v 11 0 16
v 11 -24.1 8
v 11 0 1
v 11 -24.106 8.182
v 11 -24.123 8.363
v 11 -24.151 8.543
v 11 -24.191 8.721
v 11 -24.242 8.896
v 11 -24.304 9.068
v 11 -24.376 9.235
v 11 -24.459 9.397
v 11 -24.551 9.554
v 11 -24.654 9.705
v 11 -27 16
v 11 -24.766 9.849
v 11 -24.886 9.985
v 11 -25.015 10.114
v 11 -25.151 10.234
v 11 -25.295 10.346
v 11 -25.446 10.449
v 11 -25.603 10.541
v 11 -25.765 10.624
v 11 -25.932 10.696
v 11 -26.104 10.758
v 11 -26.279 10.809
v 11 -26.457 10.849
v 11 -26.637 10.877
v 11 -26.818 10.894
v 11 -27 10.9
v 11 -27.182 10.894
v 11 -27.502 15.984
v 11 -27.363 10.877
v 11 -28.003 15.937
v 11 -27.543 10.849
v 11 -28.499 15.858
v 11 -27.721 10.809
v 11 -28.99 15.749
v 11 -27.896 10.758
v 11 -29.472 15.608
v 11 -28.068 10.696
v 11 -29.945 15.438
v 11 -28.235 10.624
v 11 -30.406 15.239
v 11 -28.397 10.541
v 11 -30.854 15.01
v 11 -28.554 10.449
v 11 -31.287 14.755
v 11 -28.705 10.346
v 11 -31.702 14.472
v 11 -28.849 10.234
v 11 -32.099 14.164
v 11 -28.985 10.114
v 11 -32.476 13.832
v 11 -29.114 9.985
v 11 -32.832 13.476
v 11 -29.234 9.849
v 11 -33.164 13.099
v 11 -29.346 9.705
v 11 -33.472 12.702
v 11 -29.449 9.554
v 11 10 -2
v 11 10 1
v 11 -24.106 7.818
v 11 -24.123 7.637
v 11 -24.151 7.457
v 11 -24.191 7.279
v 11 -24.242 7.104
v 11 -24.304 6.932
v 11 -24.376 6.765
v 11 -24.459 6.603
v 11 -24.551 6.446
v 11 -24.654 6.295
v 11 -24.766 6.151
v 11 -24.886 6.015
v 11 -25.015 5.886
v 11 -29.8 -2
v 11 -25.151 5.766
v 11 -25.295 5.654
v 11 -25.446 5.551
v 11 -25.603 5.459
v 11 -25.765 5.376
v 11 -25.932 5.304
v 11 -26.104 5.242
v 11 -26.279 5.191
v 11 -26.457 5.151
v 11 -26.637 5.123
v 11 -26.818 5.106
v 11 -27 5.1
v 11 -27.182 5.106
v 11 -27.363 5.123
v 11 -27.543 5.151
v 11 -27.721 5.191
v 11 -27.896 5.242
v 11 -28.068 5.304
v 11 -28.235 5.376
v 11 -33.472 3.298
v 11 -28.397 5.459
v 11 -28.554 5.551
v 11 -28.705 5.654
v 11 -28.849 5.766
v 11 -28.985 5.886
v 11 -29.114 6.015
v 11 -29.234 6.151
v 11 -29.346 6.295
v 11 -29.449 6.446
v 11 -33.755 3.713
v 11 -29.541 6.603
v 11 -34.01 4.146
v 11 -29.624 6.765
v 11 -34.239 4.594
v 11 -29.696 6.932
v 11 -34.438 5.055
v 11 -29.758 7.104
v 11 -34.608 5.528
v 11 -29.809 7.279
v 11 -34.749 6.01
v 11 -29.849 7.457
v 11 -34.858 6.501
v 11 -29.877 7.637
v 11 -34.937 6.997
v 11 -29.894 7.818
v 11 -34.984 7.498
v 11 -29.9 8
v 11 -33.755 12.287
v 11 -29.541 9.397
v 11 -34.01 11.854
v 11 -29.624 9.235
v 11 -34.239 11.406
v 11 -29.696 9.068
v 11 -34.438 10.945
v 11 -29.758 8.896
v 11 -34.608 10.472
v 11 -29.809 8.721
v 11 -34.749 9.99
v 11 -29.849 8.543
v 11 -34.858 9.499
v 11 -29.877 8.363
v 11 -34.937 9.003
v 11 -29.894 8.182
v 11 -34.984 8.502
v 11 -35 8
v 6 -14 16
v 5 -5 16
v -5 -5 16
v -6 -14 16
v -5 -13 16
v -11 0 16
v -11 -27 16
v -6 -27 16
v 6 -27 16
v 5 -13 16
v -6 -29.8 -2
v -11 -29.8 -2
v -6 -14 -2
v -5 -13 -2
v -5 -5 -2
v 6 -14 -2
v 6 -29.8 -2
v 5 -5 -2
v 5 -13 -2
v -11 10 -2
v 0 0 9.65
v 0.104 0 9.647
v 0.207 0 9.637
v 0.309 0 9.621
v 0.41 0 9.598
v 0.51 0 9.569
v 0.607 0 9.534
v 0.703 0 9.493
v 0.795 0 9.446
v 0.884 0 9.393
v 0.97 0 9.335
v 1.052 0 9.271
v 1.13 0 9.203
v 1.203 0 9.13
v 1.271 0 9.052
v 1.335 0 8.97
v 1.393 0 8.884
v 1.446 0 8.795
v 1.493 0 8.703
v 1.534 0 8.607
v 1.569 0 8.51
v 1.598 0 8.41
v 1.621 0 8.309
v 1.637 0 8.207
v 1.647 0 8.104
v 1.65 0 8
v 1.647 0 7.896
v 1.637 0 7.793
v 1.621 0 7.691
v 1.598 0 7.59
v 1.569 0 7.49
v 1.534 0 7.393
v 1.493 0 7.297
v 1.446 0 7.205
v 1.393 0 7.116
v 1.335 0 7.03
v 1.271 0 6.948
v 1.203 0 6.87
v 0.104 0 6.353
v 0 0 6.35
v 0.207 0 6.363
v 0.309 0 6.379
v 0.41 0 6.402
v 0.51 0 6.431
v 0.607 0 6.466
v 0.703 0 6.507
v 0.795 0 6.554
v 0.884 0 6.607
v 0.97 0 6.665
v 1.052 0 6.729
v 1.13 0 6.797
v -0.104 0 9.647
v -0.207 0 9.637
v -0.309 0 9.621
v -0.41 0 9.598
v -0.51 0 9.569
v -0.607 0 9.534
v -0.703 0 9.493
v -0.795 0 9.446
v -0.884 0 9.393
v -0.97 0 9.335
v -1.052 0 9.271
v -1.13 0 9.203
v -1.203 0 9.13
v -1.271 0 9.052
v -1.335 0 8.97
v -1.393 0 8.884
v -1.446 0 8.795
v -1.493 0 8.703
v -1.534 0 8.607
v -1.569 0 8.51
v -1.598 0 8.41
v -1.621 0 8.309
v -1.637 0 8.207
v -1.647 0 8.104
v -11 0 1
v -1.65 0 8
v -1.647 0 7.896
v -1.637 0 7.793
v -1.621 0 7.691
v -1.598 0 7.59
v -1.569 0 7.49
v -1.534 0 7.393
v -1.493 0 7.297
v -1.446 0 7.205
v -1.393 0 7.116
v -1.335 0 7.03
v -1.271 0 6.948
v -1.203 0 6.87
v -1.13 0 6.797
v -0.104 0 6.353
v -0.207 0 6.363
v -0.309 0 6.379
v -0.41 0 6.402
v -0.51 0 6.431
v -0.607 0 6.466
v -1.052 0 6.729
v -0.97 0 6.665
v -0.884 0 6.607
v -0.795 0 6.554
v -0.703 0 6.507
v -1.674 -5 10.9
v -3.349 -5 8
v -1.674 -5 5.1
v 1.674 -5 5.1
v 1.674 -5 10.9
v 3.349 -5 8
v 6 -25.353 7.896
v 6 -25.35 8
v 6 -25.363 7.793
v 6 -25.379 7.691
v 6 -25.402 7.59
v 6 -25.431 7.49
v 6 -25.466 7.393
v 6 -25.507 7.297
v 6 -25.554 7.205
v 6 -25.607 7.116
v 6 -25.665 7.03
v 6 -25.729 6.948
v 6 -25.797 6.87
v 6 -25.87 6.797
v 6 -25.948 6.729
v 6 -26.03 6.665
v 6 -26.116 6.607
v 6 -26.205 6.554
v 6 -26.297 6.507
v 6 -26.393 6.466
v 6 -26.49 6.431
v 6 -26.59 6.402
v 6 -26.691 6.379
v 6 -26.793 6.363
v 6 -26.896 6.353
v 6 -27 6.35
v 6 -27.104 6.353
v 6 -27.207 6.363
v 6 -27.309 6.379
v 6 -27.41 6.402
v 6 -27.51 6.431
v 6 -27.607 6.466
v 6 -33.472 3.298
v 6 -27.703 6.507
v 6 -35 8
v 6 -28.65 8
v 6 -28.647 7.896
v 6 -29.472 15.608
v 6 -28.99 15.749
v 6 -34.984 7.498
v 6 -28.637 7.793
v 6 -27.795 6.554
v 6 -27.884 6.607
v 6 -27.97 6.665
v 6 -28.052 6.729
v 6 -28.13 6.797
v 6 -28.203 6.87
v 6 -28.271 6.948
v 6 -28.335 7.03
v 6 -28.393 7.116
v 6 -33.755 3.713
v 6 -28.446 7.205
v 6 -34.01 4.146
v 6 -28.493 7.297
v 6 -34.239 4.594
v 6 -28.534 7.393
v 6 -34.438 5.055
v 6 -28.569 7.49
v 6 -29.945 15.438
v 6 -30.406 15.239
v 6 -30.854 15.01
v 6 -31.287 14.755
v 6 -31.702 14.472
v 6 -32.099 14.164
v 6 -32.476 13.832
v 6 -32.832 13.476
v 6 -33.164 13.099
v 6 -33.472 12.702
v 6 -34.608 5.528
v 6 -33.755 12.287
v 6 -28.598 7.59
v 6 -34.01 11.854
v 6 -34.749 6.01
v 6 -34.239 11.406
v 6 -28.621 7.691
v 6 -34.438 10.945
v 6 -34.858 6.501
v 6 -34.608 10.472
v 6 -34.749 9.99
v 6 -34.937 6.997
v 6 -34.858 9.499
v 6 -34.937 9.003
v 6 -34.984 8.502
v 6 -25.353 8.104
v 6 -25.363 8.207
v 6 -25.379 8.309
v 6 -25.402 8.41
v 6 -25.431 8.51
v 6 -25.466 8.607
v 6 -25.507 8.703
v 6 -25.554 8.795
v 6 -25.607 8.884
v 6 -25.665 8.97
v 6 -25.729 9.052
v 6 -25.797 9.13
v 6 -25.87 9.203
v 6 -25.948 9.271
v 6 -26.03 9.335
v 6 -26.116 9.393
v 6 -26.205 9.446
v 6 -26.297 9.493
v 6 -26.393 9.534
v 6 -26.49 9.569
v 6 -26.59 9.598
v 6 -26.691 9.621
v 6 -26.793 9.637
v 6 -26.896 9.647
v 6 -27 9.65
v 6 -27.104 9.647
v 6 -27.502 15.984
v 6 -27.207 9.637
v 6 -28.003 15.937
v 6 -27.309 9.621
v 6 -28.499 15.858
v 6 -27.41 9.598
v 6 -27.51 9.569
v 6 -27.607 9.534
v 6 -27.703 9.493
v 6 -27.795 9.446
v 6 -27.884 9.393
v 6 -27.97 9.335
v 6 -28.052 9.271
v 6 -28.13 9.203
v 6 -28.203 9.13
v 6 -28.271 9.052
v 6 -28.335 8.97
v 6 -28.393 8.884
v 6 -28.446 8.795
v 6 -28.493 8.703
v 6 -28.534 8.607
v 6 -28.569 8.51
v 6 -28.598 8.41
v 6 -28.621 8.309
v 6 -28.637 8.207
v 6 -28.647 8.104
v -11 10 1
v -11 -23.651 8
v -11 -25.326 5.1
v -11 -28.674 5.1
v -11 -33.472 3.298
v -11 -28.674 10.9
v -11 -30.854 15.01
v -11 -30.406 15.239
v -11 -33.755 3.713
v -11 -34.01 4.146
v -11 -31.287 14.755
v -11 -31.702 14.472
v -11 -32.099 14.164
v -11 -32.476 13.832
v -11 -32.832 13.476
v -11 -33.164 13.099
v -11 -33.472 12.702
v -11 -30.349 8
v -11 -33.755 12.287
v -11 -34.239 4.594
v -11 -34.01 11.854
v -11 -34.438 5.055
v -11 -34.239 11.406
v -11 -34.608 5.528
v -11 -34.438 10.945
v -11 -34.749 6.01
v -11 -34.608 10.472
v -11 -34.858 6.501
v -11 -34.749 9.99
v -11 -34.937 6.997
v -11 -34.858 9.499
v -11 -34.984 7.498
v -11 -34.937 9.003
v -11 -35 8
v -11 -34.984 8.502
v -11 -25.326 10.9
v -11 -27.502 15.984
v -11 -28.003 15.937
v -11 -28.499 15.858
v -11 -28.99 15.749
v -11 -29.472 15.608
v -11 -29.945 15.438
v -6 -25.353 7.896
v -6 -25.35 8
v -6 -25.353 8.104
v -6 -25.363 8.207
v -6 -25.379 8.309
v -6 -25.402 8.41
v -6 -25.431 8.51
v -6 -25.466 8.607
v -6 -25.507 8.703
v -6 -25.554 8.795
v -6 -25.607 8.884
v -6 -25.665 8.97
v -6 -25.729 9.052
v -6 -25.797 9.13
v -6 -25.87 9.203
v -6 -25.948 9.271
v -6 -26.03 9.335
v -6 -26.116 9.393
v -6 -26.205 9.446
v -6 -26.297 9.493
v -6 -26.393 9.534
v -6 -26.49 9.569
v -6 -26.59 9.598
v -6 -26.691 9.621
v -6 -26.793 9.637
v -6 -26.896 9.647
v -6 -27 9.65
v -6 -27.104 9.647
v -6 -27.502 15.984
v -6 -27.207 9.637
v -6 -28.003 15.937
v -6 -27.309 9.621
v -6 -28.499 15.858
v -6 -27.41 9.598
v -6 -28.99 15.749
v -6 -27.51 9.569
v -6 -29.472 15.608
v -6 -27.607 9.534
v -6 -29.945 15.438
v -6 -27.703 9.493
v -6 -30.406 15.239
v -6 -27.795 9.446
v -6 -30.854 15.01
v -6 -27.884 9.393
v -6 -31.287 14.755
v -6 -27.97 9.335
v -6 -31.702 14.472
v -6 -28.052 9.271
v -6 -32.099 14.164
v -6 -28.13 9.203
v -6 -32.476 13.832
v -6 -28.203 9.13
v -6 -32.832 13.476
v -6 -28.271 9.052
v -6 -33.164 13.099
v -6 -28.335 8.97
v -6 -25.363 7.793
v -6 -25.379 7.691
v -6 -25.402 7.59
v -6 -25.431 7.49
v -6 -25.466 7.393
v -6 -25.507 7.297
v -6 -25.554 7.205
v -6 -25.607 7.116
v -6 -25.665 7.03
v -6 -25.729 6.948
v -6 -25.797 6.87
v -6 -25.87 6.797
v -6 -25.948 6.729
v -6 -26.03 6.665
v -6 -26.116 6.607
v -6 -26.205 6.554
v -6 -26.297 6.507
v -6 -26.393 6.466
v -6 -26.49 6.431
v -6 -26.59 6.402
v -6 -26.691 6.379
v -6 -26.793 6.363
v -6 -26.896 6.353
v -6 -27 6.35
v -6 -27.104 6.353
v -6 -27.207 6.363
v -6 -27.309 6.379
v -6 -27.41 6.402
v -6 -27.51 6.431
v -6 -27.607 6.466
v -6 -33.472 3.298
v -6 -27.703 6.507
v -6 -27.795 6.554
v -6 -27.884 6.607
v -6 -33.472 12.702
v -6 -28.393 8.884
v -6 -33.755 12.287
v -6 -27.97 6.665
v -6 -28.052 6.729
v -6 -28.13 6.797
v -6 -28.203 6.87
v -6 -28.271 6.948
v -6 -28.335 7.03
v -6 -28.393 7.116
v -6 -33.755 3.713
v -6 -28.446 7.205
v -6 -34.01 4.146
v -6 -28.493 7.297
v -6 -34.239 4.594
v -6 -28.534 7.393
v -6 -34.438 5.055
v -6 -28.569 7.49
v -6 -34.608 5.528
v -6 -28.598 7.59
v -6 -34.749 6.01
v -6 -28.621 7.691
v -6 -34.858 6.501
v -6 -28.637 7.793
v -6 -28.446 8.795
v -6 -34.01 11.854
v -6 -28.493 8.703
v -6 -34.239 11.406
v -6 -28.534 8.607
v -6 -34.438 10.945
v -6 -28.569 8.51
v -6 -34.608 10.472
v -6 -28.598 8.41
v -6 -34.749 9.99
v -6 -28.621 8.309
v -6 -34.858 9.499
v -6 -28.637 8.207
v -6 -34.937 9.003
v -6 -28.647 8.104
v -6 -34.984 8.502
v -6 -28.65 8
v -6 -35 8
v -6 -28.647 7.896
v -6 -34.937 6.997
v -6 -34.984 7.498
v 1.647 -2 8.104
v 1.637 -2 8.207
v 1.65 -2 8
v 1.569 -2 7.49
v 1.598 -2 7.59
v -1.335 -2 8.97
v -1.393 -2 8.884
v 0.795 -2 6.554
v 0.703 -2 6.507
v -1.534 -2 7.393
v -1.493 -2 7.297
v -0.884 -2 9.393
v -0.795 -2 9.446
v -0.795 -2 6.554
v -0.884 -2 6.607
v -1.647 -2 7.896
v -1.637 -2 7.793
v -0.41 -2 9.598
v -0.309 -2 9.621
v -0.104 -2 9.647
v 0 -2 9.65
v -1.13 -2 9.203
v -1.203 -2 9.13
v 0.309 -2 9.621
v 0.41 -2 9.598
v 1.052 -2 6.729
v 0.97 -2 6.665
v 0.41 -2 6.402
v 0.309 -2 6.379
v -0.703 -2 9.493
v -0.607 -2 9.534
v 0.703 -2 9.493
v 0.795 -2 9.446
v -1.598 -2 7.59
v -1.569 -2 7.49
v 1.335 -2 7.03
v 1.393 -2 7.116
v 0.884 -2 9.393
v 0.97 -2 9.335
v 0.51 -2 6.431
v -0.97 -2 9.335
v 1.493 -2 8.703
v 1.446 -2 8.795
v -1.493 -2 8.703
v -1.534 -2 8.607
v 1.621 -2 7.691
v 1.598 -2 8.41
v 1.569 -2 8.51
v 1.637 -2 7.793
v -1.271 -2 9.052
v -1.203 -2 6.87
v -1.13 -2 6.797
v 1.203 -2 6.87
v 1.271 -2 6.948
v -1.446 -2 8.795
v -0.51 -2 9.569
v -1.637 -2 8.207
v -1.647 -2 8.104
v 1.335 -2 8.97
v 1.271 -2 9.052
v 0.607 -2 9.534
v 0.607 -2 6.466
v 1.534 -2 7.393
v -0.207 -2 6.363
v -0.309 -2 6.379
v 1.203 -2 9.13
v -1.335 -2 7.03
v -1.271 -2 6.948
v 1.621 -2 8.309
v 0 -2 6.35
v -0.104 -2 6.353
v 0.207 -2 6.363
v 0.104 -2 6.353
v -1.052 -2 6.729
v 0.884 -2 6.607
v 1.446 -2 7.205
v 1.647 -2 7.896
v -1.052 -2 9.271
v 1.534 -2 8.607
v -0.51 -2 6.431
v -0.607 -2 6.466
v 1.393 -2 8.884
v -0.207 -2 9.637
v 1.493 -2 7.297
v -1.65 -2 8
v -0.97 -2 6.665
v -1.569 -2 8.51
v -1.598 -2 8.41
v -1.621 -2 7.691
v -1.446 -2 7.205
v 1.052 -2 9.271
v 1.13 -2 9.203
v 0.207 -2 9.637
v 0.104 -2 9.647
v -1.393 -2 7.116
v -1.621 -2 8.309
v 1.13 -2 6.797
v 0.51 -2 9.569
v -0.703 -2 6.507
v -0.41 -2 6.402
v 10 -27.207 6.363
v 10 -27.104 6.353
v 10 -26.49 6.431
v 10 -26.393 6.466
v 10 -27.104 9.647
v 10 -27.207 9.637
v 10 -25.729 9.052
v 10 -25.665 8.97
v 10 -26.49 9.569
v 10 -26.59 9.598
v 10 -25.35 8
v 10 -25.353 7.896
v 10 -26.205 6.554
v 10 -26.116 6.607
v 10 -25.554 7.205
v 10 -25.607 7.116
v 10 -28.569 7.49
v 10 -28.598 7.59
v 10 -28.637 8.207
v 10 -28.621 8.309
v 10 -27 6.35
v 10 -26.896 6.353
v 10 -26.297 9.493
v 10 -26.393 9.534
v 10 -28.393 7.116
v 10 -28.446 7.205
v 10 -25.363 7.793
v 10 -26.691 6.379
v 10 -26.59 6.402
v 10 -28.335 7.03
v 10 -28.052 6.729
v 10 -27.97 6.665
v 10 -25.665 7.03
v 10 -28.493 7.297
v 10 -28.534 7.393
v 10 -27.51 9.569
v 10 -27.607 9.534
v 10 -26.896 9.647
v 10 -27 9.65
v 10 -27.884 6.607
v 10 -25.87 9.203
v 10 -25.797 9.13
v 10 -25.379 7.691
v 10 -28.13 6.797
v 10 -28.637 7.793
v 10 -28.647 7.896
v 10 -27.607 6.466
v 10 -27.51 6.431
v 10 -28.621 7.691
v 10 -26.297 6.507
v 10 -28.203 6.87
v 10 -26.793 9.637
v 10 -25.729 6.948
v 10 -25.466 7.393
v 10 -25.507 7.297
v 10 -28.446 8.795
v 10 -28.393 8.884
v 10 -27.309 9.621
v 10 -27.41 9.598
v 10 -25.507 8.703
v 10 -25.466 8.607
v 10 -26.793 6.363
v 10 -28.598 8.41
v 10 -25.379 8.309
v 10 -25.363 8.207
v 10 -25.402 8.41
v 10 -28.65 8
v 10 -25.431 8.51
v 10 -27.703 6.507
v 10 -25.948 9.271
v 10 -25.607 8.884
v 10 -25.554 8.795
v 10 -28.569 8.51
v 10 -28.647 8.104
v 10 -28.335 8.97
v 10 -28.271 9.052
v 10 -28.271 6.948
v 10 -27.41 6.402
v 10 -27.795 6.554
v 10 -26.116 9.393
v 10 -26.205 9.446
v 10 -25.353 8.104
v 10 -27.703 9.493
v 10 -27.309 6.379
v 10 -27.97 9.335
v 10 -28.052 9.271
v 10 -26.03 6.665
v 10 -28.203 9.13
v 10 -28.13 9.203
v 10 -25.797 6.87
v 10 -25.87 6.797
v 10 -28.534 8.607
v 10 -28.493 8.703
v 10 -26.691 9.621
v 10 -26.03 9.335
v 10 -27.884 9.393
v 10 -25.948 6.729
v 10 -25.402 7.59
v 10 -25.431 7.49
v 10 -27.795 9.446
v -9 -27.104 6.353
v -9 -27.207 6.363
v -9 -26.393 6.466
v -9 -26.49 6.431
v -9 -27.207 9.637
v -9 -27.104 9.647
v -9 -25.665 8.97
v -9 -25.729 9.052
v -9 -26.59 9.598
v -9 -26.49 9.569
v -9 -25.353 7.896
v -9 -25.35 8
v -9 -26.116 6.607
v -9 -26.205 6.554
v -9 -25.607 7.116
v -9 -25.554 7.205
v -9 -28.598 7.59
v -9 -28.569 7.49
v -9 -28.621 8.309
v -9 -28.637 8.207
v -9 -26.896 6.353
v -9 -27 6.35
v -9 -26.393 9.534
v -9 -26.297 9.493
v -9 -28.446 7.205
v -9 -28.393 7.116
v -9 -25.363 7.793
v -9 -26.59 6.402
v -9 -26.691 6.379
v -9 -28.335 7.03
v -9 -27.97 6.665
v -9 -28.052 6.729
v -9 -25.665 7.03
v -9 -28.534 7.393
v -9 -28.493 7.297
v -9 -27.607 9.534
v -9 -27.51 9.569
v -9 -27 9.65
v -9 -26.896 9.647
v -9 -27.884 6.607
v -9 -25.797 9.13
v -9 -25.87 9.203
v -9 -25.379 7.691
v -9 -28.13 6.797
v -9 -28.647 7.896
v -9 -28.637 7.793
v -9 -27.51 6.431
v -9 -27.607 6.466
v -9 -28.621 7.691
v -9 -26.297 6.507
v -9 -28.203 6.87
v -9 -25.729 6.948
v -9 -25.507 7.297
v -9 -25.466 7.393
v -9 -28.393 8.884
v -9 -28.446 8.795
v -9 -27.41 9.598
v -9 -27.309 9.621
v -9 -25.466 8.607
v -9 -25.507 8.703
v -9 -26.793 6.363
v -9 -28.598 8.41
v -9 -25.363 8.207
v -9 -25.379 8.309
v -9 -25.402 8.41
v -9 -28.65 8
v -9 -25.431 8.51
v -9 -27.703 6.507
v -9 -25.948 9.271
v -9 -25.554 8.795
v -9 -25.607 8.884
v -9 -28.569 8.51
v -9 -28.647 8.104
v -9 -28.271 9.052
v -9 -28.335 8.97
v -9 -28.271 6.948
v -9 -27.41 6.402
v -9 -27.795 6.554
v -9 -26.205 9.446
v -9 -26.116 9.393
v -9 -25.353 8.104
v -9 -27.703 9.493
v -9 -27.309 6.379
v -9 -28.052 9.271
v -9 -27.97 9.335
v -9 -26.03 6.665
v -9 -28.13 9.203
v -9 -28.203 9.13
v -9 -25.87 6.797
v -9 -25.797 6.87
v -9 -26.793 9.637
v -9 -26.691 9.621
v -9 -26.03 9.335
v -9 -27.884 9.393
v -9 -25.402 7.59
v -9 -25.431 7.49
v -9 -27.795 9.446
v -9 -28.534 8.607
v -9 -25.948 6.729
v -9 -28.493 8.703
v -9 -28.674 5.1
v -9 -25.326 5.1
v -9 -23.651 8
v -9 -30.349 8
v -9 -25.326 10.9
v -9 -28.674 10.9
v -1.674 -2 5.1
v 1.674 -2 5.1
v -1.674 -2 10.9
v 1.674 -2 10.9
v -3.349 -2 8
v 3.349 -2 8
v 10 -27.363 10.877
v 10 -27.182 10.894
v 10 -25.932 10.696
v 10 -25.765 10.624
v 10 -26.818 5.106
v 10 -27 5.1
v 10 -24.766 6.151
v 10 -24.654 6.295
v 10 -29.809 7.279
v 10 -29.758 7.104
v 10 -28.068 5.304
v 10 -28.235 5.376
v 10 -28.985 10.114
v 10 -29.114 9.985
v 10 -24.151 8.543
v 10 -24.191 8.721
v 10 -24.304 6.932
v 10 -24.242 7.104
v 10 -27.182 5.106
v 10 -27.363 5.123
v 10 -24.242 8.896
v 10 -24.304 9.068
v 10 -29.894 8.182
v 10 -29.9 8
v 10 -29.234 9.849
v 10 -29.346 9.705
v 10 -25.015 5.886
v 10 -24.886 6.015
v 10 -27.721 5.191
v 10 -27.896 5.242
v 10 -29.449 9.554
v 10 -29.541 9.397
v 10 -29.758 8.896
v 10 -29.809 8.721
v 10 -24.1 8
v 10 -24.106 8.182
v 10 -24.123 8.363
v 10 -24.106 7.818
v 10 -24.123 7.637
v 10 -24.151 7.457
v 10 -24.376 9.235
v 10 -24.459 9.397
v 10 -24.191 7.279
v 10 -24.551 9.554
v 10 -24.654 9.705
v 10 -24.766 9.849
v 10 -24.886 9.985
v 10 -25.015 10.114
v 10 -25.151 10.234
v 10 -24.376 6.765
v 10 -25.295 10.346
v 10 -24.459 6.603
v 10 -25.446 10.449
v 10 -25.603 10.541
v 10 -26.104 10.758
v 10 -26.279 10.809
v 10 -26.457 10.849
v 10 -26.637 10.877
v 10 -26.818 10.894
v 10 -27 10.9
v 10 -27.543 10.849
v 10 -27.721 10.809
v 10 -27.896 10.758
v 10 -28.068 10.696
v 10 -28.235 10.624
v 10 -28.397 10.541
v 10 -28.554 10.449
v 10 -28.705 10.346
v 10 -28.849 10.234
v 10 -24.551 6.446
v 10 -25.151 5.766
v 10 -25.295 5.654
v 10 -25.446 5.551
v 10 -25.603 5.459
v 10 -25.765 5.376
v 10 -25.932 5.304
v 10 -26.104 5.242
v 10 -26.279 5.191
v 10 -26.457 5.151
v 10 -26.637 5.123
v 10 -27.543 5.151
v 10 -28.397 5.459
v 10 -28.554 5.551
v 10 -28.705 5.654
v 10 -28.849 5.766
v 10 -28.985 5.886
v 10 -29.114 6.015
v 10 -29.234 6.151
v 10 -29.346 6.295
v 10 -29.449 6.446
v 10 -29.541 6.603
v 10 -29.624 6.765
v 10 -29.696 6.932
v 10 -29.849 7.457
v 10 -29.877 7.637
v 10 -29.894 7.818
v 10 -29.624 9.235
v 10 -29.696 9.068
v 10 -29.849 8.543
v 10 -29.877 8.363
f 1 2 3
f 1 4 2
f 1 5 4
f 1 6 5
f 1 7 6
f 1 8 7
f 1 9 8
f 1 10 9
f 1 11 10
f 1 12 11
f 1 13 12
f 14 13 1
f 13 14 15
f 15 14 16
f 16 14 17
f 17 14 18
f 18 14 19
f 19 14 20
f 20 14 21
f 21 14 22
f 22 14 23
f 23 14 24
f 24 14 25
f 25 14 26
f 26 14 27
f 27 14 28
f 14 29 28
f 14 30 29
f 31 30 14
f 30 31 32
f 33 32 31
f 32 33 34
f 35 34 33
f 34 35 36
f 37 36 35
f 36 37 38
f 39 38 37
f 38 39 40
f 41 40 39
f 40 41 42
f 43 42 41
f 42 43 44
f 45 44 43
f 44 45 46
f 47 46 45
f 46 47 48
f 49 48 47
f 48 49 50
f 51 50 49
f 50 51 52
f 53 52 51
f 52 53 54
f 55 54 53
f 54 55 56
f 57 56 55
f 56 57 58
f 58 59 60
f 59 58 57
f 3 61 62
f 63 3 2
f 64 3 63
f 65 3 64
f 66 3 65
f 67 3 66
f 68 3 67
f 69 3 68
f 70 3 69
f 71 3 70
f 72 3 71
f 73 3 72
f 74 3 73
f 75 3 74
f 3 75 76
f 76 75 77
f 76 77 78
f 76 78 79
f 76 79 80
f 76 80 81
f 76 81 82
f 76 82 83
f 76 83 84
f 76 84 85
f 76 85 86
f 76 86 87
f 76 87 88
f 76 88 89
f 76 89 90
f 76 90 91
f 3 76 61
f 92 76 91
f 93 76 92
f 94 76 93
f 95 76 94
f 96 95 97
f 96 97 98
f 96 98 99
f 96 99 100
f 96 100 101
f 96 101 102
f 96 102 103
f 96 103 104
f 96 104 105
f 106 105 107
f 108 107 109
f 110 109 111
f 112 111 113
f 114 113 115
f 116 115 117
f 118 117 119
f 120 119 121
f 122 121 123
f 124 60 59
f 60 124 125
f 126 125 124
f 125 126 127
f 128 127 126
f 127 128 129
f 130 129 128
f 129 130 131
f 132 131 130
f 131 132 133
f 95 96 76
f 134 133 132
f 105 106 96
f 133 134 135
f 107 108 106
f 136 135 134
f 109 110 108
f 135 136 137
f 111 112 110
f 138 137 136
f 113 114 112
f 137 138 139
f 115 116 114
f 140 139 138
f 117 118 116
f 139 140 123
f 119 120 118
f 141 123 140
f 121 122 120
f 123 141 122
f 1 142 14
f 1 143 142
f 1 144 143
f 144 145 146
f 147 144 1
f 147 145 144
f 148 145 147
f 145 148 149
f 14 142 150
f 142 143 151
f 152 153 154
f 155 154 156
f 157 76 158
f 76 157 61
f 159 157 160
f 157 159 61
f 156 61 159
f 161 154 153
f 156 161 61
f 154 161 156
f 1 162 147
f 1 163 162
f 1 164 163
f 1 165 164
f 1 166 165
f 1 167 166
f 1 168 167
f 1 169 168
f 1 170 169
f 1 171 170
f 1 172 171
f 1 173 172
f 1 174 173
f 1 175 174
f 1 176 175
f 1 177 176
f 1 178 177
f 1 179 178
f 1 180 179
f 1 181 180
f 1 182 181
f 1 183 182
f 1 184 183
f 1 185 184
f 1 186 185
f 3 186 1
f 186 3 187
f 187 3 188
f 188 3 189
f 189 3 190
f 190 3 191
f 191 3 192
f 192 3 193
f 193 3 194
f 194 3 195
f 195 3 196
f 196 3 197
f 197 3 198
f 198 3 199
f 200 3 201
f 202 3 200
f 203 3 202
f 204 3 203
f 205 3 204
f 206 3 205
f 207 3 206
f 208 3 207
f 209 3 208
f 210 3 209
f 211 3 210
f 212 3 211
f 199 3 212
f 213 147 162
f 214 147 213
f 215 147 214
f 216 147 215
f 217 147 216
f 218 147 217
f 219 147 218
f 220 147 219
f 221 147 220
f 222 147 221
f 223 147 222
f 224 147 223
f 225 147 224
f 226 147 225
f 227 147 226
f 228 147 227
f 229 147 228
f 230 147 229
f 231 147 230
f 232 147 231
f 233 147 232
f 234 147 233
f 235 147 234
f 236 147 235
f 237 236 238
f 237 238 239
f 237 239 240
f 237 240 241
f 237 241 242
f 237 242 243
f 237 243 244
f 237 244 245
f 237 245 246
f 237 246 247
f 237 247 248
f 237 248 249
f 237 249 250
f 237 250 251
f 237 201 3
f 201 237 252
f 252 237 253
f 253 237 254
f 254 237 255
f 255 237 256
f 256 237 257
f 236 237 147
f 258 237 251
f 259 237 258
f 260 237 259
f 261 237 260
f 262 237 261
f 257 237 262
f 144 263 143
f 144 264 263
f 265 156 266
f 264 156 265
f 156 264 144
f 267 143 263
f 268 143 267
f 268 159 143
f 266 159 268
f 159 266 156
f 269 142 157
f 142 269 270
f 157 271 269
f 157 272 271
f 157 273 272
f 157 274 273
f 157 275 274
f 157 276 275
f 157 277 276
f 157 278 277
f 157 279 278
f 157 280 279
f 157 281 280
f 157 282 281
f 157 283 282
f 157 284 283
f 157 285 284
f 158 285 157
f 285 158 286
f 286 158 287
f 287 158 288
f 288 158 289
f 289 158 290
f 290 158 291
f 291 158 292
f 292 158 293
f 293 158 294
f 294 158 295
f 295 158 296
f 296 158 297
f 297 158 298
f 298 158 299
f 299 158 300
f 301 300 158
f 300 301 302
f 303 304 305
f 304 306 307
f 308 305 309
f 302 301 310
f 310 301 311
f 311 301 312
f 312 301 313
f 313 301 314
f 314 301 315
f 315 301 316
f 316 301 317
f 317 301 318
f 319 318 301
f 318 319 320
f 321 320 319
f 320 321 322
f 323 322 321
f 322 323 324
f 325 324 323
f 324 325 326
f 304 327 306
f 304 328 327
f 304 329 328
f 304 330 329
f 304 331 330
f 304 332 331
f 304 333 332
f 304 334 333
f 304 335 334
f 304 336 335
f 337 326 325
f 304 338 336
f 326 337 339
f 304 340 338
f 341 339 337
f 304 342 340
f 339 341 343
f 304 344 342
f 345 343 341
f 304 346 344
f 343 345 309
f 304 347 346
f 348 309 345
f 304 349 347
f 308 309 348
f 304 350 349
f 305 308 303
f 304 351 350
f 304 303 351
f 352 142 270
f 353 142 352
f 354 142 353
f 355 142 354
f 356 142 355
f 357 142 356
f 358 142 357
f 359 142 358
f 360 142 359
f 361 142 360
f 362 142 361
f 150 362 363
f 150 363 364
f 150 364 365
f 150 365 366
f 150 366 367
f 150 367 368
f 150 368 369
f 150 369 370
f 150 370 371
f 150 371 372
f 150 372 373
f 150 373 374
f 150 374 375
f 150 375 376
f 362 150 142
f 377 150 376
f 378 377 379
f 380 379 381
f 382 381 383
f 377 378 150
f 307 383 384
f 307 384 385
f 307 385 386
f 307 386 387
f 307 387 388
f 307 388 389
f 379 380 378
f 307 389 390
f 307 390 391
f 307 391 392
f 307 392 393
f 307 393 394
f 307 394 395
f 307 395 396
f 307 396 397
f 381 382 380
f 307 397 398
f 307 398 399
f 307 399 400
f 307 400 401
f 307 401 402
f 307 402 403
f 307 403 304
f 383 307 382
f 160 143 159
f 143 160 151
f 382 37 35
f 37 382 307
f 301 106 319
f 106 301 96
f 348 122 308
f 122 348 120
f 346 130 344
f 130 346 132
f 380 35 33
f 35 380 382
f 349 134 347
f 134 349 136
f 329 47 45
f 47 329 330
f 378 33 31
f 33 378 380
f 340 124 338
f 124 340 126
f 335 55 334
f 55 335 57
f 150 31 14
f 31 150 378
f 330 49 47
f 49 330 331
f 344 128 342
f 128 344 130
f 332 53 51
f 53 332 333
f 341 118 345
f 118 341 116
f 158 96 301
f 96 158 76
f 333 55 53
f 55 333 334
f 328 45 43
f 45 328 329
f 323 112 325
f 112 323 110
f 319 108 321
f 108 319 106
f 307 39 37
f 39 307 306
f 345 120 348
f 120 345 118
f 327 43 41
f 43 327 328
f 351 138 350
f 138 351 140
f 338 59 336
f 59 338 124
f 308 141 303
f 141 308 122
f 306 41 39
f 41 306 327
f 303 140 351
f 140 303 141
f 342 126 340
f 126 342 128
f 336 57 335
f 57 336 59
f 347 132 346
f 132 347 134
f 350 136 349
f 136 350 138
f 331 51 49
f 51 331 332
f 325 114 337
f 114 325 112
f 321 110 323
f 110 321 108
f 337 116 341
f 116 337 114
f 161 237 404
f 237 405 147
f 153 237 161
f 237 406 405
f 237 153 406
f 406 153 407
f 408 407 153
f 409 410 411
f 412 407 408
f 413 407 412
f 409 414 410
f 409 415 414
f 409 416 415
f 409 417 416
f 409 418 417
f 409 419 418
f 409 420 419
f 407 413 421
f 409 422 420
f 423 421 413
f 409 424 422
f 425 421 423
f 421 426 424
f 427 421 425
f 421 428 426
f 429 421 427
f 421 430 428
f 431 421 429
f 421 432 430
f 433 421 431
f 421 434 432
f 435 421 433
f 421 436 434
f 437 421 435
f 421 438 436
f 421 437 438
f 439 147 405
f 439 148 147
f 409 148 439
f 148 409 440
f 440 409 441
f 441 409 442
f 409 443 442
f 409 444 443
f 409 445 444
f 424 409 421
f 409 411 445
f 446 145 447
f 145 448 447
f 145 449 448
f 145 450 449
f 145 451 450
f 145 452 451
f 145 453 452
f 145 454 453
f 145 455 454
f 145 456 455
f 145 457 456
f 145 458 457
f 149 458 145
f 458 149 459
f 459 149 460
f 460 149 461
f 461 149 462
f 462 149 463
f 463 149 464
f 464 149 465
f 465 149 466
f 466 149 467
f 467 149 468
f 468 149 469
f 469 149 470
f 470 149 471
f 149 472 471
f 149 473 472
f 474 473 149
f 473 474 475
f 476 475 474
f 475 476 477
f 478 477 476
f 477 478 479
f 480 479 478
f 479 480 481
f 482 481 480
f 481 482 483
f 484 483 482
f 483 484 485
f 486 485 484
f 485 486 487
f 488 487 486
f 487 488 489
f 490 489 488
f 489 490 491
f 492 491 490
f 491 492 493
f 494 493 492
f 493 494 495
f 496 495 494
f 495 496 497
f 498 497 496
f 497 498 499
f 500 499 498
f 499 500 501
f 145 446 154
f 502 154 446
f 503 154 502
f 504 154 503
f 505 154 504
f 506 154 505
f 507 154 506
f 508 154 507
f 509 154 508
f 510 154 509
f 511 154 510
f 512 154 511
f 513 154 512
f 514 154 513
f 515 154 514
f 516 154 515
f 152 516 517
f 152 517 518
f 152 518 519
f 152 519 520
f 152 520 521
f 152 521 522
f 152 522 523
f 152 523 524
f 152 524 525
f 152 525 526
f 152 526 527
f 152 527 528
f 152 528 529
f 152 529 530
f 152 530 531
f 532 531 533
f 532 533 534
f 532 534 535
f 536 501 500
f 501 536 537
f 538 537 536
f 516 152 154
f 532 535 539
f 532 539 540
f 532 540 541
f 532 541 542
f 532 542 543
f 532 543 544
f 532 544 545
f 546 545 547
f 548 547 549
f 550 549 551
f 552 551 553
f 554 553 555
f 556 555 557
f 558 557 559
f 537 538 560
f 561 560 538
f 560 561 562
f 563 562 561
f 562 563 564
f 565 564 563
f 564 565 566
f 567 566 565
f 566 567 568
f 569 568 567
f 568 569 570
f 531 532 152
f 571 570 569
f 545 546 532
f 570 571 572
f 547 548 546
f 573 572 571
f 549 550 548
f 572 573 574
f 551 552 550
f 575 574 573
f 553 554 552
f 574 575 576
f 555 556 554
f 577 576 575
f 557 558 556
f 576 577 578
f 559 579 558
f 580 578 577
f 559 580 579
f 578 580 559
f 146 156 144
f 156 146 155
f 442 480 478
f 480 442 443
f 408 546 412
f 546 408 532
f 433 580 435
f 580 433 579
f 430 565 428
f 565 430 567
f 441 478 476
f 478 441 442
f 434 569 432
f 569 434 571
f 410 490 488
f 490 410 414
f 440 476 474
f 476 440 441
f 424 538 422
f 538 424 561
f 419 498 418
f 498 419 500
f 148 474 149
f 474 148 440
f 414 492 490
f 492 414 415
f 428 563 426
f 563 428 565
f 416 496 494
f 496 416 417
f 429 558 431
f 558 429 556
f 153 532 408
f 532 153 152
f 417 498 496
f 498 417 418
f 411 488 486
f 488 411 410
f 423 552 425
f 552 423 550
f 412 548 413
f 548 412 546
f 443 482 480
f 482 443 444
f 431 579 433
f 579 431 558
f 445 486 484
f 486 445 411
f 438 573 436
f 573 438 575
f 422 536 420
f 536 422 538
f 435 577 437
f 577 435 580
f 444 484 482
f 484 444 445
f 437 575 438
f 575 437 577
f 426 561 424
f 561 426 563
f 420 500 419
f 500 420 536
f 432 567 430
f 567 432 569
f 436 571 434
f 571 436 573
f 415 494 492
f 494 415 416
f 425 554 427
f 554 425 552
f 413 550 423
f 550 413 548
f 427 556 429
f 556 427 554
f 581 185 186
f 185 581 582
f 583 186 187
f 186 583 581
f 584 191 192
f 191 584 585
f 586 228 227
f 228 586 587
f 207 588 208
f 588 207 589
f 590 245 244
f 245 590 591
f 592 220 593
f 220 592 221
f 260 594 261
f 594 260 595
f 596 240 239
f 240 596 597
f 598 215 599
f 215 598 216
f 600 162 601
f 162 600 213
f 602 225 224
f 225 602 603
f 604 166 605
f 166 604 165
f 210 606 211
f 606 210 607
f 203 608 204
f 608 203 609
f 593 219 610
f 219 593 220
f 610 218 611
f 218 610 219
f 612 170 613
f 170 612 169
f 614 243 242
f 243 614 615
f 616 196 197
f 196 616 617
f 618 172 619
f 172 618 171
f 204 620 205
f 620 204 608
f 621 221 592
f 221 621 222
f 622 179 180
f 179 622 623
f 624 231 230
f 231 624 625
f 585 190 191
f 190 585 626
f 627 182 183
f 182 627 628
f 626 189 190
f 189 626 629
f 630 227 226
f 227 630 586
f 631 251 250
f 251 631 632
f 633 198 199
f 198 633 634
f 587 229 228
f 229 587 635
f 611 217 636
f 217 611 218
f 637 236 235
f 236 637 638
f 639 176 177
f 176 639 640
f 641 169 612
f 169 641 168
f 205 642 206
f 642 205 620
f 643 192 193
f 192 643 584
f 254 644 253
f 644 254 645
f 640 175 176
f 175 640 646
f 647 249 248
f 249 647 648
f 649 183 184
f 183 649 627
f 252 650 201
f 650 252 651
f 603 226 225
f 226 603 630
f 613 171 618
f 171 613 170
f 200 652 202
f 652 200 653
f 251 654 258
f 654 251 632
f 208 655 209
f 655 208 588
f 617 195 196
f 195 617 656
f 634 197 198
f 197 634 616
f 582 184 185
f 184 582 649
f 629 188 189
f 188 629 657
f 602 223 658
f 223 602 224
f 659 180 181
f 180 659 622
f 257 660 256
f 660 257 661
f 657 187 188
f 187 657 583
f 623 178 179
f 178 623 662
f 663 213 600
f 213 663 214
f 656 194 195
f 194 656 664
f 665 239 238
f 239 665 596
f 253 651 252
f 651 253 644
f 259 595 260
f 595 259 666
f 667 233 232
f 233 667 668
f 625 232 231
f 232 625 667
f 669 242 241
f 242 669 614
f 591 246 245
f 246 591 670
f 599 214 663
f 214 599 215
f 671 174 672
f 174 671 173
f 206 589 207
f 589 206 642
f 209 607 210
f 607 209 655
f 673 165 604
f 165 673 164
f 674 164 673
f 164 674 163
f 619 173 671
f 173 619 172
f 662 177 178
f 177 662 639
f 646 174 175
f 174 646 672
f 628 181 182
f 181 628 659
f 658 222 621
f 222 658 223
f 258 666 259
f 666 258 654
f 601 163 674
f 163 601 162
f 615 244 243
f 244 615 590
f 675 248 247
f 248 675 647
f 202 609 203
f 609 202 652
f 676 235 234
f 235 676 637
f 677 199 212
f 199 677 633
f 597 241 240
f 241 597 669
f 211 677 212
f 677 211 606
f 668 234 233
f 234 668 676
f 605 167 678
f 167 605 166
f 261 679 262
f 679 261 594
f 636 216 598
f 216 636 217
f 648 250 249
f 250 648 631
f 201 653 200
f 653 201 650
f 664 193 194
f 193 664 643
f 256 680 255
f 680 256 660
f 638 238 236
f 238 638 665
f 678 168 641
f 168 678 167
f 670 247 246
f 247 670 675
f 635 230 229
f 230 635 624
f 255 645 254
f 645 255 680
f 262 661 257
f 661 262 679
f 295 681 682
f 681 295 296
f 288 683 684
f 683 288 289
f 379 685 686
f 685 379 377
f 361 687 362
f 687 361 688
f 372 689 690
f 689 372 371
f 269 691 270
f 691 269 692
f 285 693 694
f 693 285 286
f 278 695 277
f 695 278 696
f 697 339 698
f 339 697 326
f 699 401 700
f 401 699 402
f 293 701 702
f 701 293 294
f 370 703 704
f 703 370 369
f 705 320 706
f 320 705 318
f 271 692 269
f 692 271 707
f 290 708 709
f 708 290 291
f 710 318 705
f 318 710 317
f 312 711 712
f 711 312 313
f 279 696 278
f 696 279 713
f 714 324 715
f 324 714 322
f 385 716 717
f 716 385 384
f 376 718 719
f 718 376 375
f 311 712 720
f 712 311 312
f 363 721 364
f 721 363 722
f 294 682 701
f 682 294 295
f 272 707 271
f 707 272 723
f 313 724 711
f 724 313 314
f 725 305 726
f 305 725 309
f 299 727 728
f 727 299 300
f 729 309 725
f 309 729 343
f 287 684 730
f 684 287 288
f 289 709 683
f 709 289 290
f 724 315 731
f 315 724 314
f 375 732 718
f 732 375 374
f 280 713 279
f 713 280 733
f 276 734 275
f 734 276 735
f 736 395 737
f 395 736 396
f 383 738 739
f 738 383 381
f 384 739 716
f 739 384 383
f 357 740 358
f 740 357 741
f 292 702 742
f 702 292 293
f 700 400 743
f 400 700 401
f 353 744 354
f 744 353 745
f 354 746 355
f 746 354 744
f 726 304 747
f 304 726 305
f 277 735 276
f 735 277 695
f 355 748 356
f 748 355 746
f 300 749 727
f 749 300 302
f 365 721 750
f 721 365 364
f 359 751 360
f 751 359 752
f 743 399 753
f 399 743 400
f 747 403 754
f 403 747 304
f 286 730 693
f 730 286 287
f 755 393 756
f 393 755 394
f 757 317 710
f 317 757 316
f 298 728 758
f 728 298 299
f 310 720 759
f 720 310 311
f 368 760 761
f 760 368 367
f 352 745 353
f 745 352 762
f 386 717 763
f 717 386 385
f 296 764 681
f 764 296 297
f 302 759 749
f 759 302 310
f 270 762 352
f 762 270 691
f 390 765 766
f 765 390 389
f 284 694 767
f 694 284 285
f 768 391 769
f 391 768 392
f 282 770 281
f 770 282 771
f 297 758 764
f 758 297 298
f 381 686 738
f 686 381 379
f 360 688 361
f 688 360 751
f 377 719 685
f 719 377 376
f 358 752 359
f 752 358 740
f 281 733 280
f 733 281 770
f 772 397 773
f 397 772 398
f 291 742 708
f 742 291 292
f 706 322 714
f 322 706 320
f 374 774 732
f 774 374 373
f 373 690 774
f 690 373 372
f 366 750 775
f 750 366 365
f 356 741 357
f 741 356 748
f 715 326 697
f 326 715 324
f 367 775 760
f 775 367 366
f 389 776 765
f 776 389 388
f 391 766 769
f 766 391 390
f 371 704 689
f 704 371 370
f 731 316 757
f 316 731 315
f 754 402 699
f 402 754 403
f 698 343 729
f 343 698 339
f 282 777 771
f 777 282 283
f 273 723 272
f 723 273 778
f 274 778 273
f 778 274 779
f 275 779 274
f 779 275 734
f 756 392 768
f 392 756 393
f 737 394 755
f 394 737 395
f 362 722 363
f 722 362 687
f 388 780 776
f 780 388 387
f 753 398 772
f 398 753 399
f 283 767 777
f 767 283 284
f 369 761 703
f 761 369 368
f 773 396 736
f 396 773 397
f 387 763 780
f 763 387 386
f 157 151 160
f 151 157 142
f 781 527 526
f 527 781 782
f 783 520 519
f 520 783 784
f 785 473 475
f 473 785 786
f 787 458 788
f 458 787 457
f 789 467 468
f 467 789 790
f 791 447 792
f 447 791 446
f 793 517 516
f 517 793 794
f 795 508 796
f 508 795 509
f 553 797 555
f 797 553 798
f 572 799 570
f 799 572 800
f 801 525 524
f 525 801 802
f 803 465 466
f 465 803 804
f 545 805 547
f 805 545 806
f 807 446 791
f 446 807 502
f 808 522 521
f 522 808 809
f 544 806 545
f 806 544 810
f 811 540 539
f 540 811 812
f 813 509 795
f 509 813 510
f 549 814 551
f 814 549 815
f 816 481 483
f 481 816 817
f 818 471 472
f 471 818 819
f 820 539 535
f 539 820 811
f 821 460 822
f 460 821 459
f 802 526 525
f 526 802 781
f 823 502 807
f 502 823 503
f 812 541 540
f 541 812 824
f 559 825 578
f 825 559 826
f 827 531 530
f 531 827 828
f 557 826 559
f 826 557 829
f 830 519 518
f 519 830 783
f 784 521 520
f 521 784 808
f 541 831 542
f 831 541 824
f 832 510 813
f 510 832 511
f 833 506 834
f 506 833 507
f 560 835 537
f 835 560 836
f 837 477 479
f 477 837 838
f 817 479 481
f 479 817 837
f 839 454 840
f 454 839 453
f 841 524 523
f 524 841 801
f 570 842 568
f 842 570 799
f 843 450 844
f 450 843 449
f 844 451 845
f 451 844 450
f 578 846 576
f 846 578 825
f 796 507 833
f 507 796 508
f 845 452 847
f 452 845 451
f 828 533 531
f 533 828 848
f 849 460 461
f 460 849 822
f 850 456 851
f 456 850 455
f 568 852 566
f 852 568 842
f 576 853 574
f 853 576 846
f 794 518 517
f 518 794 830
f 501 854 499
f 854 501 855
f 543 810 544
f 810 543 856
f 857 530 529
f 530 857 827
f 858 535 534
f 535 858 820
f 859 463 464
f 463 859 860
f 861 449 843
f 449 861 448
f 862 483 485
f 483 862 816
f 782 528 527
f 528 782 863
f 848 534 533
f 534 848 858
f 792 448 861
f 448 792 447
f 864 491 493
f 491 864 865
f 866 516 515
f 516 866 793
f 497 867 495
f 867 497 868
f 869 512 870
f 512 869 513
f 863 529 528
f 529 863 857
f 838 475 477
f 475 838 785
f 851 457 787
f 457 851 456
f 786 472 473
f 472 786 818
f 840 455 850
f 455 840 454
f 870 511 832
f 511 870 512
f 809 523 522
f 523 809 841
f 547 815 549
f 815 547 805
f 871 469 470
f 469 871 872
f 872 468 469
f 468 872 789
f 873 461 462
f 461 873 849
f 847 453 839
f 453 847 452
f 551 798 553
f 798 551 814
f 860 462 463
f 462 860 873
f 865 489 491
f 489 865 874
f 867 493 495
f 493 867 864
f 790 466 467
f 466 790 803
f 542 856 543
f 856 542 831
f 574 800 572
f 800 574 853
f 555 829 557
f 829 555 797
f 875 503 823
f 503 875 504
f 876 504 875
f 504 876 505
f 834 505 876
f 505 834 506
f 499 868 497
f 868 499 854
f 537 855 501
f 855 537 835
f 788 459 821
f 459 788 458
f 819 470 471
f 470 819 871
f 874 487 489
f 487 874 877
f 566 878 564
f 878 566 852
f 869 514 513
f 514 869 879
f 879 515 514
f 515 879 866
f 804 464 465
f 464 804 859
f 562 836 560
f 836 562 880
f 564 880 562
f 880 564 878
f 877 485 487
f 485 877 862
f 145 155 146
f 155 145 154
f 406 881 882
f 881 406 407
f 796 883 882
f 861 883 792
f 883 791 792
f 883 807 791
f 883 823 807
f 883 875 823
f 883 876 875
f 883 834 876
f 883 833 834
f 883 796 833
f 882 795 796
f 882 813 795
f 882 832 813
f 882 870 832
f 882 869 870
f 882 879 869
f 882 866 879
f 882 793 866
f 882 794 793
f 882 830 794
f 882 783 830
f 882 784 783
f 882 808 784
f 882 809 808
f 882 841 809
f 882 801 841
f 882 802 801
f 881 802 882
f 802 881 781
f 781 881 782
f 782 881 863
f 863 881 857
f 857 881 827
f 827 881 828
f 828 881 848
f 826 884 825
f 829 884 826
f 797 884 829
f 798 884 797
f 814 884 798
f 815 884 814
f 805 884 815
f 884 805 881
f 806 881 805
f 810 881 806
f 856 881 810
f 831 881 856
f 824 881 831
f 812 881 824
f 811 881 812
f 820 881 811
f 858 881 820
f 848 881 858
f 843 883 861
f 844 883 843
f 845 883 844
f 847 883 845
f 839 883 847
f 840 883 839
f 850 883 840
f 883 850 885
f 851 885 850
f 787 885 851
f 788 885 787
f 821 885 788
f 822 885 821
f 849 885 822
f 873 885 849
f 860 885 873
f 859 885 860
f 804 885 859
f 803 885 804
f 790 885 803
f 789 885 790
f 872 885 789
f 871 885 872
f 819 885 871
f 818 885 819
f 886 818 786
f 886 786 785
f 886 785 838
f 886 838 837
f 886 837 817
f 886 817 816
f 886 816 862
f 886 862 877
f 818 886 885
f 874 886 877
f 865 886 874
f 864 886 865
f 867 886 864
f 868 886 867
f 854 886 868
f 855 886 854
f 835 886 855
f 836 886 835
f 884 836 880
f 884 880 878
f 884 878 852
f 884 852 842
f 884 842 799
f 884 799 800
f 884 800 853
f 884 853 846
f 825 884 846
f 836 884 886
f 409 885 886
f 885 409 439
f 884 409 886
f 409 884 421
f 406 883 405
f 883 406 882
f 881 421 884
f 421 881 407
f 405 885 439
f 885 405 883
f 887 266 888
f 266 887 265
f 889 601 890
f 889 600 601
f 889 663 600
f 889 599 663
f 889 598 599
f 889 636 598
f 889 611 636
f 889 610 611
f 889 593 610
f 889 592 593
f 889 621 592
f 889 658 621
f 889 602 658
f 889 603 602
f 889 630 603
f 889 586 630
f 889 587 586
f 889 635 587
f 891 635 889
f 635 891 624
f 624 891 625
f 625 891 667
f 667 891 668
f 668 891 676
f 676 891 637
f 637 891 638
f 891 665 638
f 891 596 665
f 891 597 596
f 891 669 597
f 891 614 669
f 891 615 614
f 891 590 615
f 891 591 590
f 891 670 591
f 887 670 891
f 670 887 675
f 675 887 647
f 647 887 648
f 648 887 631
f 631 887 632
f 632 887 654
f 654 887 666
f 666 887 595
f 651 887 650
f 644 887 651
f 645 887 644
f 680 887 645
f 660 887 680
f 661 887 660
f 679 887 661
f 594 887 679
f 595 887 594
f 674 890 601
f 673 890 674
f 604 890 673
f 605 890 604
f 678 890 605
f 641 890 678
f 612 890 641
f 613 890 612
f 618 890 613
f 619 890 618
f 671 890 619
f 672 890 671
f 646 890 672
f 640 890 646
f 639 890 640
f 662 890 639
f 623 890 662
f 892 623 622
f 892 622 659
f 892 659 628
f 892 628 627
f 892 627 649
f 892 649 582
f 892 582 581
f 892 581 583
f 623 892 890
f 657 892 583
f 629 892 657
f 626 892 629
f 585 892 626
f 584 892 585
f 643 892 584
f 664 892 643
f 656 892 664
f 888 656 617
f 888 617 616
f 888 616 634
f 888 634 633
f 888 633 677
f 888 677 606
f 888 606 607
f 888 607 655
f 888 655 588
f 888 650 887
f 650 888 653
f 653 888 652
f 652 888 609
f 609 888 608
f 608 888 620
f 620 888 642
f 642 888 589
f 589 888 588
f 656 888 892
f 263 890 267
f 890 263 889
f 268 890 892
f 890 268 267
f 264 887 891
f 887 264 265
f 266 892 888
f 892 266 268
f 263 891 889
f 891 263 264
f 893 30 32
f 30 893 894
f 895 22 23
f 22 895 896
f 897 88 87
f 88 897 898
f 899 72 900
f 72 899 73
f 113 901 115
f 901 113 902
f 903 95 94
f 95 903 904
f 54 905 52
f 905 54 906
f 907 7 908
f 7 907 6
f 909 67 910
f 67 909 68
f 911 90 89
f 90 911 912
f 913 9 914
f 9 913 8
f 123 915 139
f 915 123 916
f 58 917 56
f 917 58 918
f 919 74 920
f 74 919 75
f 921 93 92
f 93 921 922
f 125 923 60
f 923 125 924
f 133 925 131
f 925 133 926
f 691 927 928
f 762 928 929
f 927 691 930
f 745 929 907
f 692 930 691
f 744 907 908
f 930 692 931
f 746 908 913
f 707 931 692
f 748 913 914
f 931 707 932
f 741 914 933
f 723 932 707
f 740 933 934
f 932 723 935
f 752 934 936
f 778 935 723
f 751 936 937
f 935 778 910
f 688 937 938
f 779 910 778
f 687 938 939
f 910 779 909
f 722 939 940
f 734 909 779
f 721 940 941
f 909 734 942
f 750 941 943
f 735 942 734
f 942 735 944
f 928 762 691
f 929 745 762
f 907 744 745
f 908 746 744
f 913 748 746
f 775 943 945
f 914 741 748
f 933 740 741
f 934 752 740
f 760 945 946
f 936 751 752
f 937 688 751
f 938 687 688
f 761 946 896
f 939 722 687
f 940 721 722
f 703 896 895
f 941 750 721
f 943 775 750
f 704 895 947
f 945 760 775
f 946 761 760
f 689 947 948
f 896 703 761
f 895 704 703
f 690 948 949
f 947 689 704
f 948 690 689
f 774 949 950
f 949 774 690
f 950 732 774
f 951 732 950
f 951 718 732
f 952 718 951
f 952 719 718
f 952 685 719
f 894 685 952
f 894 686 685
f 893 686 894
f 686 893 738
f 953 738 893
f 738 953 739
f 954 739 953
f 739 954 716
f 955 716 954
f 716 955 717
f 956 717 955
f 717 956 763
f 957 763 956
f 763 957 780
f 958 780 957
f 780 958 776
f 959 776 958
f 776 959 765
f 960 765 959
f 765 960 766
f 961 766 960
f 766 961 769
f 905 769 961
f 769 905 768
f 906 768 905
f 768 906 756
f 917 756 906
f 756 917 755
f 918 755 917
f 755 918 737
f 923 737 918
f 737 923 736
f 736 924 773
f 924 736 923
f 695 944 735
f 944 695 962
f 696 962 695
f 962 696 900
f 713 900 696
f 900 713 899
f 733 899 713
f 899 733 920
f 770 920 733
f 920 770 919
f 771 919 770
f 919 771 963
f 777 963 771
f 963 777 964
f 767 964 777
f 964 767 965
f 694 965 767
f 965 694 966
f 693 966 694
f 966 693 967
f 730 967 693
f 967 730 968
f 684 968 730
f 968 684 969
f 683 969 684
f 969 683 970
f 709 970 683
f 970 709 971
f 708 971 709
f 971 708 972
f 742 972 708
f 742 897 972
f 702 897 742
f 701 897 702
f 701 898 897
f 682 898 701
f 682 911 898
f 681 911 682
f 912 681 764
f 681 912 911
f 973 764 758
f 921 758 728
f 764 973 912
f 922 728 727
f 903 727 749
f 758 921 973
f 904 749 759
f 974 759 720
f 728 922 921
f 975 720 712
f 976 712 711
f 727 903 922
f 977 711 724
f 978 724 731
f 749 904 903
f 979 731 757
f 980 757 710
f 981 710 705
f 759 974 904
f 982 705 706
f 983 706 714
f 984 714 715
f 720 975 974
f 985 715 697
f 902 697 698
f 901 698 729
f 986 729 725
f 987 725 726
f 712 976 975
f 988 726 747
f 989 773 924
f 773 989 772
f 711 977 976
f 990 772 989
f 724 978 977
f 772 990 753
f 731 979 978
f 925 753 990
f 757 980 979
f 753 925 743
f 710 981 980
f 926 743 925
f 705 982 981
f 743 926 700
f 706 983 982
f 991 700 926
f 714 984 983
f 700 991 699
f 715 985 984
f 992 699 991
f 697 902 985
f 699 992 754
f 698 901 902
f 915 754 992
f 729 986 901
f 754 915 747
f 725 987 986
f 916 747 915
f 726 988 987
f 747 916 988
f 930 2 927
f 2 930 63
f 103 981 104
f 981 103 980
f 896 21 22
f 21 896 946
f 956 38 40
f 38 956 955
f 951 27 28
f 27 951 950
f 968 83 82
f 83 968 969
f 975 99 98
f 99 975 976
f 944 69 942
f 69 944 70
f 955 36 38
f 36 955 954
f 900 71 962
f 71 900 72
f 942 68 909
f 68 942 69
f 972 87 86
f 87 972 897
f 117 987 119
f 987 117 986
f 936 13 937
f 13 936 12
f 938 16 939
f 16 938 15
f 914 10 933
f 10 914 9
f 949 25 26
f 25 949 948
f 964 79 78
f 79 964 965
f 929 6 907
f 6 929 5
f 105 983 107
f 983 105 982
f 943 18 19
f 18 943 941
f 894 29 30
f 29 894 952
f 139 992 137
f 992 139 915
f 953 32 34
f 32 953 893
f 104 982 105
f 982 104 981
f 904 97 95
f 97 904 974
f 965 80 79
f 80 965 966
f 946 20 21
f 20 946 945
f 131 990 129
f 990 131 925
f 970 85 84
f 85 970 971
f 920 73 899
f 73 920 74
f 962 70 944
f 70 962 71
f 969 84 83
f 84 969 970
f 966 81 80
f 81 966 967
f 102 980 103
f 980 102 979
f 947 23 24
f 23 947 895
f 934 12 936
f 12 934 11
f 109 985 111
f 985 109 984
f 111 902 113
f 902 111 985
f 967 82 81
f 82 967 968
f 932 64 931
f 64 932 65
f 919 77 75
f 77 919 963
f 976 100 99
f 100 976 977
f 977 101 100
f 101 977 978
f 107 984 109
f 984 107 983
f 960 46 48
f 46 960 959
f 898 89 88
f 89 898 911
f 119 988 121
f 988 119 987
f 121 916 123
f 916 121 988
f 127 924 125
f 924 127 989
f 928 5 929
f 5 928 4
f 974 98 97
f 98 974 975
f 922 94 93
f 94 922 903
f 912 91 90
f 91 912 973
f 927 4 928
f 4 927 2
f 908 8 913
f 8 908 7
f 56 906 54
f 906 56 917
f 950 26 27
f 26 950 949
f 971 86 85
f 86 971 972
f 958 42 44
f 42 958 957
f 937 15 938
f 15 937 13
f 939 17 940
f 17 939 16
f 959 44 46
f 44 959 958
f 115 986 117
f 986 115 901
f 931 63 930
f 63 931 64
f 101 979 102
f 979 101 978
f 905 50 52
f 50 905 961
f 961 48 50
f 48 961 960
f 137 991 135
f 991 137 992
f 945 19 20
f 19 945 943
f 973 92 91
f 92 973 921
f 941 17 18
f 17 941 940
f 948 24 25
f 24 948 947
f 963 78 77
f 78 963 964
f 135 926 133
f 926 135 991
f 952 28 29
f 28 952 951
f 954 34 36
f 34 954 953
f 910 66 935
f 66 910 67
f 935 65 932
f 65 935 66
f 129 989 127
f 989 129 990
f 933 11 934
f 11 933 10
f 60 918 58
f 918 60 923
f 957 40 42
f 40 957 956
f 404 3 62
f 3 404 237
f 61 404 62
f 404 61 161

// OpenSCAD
// Created from Code_Yidler_623.stl
// https://github.com/Mecan0/Code
// By J.Rodigo (www.jra.so)
// Licence Creative commons atribution & share alike.

/**************************/
// Parámetros de la pieza  /
/**************************/

dTal = 3.3;		// Diámetro del taladro (Soporte) (6.4)

//Características del tornillo (Polea)
dTor = 3.3;		// Diámetro de la rosca (3.3)
dCab = 5.8;		// Diámetro de la cabeza (5.6)
hHex = 5.8;		// Altura entre caras planas de la tuerca (5.8)


// Media pieza
module mpieza(){
	// Bloque a lo largo del eje X
		translate([0, -5, -2])
		cube([11, 5, 18]);

	//	Bloque a lo largo del eje Y
	//	Bloque grande
		translate([6, -27, -2])
		cube([5, 27, 18]);
	//	Bloque pequeño
		translate([5, -14, -2])
		cube([1, 9, 18]);
		hull(){
			//	Redondeo
			translate([6, -27, 8])
			rotate( 90, [0, 1, 0])
			cylinder(h = 5, r = 8, $fn=100);
			// Chaflán inferior
			translate([6, -29.8, -2])
			cube([5, 12, 1]);
		}
}

// Operaciones para media pieza
module moperaciones(){
	// Taladro del soporte
	translate([0, 1, 8])
	rotate( 90, [1, 0, 0])
	cylinder(h = 7, r = dTal/2, $fn=100);
	// Taladro para la polea
	translate([5, -27, 8])
	rotate( 90, [0, 1, 0])
	cylinder(h = 7, r = dTor/2, $fn=100);
	// Chaflán interior
	translate([6, -14, -3])
	rotate( 225, [0, 0, -1])
	cube([2, 1, 22]);
}

// Generar un hexágono circunscrito (Diámetro,Altura) 
module hexagono(d,h){ 
	for (a = [0, 60,120]){ 
		rotate( a, [0, 0, 1])
		cube([d, d*tan(30), h], center = true);
	}
}

// Alojamiento de la cabeza del tornillo 
module tcab(){ 
	translate([10, -27, 8])
	rotate( 90, [0, 1, 0])
	cylinder(h = 2, r = dCab/2, $fn=100);
}

// Alojamiento de la tuerca
module tuerca(){ 
	translate([-11, -27, 8])
	rotate( 90, [0, 1, 0])
	hexagono(hHex, 4);

}

// Creamos la pieza a partir de las operacione
module pieza(){

translate([0,5,-0.5])
cube([22,10,3],center=true);

	difference () {
		union() {
			// Pieza situada en {+X,-Y,+Z}
			mpieza();	

			// Pieza simétrica situada en {-X,-Y,+Z}
			mirror([ 1, 0, 0 ])
			mpieza();
		}	
		union() {
			// Operaciones situadas en {+X,-Y,+Z}
			moperaciones();

			// Operaciones simétricas situadas en {-X,-Y,+Z}
			mirror([ 1, 0, 0 ])
			moperaciones();

		// Operaciones únicas para cada lado
			// Vaciado para la cabeza del tornillo
			tcab();
			// Vaciado para la tuerca hexagonal 
			tuerca();
			translate([-27,7,0])
			rotate([0,0,90])
			tuerca();
		}	
	}
}

// Generamos la pieza!!

	pieza();
